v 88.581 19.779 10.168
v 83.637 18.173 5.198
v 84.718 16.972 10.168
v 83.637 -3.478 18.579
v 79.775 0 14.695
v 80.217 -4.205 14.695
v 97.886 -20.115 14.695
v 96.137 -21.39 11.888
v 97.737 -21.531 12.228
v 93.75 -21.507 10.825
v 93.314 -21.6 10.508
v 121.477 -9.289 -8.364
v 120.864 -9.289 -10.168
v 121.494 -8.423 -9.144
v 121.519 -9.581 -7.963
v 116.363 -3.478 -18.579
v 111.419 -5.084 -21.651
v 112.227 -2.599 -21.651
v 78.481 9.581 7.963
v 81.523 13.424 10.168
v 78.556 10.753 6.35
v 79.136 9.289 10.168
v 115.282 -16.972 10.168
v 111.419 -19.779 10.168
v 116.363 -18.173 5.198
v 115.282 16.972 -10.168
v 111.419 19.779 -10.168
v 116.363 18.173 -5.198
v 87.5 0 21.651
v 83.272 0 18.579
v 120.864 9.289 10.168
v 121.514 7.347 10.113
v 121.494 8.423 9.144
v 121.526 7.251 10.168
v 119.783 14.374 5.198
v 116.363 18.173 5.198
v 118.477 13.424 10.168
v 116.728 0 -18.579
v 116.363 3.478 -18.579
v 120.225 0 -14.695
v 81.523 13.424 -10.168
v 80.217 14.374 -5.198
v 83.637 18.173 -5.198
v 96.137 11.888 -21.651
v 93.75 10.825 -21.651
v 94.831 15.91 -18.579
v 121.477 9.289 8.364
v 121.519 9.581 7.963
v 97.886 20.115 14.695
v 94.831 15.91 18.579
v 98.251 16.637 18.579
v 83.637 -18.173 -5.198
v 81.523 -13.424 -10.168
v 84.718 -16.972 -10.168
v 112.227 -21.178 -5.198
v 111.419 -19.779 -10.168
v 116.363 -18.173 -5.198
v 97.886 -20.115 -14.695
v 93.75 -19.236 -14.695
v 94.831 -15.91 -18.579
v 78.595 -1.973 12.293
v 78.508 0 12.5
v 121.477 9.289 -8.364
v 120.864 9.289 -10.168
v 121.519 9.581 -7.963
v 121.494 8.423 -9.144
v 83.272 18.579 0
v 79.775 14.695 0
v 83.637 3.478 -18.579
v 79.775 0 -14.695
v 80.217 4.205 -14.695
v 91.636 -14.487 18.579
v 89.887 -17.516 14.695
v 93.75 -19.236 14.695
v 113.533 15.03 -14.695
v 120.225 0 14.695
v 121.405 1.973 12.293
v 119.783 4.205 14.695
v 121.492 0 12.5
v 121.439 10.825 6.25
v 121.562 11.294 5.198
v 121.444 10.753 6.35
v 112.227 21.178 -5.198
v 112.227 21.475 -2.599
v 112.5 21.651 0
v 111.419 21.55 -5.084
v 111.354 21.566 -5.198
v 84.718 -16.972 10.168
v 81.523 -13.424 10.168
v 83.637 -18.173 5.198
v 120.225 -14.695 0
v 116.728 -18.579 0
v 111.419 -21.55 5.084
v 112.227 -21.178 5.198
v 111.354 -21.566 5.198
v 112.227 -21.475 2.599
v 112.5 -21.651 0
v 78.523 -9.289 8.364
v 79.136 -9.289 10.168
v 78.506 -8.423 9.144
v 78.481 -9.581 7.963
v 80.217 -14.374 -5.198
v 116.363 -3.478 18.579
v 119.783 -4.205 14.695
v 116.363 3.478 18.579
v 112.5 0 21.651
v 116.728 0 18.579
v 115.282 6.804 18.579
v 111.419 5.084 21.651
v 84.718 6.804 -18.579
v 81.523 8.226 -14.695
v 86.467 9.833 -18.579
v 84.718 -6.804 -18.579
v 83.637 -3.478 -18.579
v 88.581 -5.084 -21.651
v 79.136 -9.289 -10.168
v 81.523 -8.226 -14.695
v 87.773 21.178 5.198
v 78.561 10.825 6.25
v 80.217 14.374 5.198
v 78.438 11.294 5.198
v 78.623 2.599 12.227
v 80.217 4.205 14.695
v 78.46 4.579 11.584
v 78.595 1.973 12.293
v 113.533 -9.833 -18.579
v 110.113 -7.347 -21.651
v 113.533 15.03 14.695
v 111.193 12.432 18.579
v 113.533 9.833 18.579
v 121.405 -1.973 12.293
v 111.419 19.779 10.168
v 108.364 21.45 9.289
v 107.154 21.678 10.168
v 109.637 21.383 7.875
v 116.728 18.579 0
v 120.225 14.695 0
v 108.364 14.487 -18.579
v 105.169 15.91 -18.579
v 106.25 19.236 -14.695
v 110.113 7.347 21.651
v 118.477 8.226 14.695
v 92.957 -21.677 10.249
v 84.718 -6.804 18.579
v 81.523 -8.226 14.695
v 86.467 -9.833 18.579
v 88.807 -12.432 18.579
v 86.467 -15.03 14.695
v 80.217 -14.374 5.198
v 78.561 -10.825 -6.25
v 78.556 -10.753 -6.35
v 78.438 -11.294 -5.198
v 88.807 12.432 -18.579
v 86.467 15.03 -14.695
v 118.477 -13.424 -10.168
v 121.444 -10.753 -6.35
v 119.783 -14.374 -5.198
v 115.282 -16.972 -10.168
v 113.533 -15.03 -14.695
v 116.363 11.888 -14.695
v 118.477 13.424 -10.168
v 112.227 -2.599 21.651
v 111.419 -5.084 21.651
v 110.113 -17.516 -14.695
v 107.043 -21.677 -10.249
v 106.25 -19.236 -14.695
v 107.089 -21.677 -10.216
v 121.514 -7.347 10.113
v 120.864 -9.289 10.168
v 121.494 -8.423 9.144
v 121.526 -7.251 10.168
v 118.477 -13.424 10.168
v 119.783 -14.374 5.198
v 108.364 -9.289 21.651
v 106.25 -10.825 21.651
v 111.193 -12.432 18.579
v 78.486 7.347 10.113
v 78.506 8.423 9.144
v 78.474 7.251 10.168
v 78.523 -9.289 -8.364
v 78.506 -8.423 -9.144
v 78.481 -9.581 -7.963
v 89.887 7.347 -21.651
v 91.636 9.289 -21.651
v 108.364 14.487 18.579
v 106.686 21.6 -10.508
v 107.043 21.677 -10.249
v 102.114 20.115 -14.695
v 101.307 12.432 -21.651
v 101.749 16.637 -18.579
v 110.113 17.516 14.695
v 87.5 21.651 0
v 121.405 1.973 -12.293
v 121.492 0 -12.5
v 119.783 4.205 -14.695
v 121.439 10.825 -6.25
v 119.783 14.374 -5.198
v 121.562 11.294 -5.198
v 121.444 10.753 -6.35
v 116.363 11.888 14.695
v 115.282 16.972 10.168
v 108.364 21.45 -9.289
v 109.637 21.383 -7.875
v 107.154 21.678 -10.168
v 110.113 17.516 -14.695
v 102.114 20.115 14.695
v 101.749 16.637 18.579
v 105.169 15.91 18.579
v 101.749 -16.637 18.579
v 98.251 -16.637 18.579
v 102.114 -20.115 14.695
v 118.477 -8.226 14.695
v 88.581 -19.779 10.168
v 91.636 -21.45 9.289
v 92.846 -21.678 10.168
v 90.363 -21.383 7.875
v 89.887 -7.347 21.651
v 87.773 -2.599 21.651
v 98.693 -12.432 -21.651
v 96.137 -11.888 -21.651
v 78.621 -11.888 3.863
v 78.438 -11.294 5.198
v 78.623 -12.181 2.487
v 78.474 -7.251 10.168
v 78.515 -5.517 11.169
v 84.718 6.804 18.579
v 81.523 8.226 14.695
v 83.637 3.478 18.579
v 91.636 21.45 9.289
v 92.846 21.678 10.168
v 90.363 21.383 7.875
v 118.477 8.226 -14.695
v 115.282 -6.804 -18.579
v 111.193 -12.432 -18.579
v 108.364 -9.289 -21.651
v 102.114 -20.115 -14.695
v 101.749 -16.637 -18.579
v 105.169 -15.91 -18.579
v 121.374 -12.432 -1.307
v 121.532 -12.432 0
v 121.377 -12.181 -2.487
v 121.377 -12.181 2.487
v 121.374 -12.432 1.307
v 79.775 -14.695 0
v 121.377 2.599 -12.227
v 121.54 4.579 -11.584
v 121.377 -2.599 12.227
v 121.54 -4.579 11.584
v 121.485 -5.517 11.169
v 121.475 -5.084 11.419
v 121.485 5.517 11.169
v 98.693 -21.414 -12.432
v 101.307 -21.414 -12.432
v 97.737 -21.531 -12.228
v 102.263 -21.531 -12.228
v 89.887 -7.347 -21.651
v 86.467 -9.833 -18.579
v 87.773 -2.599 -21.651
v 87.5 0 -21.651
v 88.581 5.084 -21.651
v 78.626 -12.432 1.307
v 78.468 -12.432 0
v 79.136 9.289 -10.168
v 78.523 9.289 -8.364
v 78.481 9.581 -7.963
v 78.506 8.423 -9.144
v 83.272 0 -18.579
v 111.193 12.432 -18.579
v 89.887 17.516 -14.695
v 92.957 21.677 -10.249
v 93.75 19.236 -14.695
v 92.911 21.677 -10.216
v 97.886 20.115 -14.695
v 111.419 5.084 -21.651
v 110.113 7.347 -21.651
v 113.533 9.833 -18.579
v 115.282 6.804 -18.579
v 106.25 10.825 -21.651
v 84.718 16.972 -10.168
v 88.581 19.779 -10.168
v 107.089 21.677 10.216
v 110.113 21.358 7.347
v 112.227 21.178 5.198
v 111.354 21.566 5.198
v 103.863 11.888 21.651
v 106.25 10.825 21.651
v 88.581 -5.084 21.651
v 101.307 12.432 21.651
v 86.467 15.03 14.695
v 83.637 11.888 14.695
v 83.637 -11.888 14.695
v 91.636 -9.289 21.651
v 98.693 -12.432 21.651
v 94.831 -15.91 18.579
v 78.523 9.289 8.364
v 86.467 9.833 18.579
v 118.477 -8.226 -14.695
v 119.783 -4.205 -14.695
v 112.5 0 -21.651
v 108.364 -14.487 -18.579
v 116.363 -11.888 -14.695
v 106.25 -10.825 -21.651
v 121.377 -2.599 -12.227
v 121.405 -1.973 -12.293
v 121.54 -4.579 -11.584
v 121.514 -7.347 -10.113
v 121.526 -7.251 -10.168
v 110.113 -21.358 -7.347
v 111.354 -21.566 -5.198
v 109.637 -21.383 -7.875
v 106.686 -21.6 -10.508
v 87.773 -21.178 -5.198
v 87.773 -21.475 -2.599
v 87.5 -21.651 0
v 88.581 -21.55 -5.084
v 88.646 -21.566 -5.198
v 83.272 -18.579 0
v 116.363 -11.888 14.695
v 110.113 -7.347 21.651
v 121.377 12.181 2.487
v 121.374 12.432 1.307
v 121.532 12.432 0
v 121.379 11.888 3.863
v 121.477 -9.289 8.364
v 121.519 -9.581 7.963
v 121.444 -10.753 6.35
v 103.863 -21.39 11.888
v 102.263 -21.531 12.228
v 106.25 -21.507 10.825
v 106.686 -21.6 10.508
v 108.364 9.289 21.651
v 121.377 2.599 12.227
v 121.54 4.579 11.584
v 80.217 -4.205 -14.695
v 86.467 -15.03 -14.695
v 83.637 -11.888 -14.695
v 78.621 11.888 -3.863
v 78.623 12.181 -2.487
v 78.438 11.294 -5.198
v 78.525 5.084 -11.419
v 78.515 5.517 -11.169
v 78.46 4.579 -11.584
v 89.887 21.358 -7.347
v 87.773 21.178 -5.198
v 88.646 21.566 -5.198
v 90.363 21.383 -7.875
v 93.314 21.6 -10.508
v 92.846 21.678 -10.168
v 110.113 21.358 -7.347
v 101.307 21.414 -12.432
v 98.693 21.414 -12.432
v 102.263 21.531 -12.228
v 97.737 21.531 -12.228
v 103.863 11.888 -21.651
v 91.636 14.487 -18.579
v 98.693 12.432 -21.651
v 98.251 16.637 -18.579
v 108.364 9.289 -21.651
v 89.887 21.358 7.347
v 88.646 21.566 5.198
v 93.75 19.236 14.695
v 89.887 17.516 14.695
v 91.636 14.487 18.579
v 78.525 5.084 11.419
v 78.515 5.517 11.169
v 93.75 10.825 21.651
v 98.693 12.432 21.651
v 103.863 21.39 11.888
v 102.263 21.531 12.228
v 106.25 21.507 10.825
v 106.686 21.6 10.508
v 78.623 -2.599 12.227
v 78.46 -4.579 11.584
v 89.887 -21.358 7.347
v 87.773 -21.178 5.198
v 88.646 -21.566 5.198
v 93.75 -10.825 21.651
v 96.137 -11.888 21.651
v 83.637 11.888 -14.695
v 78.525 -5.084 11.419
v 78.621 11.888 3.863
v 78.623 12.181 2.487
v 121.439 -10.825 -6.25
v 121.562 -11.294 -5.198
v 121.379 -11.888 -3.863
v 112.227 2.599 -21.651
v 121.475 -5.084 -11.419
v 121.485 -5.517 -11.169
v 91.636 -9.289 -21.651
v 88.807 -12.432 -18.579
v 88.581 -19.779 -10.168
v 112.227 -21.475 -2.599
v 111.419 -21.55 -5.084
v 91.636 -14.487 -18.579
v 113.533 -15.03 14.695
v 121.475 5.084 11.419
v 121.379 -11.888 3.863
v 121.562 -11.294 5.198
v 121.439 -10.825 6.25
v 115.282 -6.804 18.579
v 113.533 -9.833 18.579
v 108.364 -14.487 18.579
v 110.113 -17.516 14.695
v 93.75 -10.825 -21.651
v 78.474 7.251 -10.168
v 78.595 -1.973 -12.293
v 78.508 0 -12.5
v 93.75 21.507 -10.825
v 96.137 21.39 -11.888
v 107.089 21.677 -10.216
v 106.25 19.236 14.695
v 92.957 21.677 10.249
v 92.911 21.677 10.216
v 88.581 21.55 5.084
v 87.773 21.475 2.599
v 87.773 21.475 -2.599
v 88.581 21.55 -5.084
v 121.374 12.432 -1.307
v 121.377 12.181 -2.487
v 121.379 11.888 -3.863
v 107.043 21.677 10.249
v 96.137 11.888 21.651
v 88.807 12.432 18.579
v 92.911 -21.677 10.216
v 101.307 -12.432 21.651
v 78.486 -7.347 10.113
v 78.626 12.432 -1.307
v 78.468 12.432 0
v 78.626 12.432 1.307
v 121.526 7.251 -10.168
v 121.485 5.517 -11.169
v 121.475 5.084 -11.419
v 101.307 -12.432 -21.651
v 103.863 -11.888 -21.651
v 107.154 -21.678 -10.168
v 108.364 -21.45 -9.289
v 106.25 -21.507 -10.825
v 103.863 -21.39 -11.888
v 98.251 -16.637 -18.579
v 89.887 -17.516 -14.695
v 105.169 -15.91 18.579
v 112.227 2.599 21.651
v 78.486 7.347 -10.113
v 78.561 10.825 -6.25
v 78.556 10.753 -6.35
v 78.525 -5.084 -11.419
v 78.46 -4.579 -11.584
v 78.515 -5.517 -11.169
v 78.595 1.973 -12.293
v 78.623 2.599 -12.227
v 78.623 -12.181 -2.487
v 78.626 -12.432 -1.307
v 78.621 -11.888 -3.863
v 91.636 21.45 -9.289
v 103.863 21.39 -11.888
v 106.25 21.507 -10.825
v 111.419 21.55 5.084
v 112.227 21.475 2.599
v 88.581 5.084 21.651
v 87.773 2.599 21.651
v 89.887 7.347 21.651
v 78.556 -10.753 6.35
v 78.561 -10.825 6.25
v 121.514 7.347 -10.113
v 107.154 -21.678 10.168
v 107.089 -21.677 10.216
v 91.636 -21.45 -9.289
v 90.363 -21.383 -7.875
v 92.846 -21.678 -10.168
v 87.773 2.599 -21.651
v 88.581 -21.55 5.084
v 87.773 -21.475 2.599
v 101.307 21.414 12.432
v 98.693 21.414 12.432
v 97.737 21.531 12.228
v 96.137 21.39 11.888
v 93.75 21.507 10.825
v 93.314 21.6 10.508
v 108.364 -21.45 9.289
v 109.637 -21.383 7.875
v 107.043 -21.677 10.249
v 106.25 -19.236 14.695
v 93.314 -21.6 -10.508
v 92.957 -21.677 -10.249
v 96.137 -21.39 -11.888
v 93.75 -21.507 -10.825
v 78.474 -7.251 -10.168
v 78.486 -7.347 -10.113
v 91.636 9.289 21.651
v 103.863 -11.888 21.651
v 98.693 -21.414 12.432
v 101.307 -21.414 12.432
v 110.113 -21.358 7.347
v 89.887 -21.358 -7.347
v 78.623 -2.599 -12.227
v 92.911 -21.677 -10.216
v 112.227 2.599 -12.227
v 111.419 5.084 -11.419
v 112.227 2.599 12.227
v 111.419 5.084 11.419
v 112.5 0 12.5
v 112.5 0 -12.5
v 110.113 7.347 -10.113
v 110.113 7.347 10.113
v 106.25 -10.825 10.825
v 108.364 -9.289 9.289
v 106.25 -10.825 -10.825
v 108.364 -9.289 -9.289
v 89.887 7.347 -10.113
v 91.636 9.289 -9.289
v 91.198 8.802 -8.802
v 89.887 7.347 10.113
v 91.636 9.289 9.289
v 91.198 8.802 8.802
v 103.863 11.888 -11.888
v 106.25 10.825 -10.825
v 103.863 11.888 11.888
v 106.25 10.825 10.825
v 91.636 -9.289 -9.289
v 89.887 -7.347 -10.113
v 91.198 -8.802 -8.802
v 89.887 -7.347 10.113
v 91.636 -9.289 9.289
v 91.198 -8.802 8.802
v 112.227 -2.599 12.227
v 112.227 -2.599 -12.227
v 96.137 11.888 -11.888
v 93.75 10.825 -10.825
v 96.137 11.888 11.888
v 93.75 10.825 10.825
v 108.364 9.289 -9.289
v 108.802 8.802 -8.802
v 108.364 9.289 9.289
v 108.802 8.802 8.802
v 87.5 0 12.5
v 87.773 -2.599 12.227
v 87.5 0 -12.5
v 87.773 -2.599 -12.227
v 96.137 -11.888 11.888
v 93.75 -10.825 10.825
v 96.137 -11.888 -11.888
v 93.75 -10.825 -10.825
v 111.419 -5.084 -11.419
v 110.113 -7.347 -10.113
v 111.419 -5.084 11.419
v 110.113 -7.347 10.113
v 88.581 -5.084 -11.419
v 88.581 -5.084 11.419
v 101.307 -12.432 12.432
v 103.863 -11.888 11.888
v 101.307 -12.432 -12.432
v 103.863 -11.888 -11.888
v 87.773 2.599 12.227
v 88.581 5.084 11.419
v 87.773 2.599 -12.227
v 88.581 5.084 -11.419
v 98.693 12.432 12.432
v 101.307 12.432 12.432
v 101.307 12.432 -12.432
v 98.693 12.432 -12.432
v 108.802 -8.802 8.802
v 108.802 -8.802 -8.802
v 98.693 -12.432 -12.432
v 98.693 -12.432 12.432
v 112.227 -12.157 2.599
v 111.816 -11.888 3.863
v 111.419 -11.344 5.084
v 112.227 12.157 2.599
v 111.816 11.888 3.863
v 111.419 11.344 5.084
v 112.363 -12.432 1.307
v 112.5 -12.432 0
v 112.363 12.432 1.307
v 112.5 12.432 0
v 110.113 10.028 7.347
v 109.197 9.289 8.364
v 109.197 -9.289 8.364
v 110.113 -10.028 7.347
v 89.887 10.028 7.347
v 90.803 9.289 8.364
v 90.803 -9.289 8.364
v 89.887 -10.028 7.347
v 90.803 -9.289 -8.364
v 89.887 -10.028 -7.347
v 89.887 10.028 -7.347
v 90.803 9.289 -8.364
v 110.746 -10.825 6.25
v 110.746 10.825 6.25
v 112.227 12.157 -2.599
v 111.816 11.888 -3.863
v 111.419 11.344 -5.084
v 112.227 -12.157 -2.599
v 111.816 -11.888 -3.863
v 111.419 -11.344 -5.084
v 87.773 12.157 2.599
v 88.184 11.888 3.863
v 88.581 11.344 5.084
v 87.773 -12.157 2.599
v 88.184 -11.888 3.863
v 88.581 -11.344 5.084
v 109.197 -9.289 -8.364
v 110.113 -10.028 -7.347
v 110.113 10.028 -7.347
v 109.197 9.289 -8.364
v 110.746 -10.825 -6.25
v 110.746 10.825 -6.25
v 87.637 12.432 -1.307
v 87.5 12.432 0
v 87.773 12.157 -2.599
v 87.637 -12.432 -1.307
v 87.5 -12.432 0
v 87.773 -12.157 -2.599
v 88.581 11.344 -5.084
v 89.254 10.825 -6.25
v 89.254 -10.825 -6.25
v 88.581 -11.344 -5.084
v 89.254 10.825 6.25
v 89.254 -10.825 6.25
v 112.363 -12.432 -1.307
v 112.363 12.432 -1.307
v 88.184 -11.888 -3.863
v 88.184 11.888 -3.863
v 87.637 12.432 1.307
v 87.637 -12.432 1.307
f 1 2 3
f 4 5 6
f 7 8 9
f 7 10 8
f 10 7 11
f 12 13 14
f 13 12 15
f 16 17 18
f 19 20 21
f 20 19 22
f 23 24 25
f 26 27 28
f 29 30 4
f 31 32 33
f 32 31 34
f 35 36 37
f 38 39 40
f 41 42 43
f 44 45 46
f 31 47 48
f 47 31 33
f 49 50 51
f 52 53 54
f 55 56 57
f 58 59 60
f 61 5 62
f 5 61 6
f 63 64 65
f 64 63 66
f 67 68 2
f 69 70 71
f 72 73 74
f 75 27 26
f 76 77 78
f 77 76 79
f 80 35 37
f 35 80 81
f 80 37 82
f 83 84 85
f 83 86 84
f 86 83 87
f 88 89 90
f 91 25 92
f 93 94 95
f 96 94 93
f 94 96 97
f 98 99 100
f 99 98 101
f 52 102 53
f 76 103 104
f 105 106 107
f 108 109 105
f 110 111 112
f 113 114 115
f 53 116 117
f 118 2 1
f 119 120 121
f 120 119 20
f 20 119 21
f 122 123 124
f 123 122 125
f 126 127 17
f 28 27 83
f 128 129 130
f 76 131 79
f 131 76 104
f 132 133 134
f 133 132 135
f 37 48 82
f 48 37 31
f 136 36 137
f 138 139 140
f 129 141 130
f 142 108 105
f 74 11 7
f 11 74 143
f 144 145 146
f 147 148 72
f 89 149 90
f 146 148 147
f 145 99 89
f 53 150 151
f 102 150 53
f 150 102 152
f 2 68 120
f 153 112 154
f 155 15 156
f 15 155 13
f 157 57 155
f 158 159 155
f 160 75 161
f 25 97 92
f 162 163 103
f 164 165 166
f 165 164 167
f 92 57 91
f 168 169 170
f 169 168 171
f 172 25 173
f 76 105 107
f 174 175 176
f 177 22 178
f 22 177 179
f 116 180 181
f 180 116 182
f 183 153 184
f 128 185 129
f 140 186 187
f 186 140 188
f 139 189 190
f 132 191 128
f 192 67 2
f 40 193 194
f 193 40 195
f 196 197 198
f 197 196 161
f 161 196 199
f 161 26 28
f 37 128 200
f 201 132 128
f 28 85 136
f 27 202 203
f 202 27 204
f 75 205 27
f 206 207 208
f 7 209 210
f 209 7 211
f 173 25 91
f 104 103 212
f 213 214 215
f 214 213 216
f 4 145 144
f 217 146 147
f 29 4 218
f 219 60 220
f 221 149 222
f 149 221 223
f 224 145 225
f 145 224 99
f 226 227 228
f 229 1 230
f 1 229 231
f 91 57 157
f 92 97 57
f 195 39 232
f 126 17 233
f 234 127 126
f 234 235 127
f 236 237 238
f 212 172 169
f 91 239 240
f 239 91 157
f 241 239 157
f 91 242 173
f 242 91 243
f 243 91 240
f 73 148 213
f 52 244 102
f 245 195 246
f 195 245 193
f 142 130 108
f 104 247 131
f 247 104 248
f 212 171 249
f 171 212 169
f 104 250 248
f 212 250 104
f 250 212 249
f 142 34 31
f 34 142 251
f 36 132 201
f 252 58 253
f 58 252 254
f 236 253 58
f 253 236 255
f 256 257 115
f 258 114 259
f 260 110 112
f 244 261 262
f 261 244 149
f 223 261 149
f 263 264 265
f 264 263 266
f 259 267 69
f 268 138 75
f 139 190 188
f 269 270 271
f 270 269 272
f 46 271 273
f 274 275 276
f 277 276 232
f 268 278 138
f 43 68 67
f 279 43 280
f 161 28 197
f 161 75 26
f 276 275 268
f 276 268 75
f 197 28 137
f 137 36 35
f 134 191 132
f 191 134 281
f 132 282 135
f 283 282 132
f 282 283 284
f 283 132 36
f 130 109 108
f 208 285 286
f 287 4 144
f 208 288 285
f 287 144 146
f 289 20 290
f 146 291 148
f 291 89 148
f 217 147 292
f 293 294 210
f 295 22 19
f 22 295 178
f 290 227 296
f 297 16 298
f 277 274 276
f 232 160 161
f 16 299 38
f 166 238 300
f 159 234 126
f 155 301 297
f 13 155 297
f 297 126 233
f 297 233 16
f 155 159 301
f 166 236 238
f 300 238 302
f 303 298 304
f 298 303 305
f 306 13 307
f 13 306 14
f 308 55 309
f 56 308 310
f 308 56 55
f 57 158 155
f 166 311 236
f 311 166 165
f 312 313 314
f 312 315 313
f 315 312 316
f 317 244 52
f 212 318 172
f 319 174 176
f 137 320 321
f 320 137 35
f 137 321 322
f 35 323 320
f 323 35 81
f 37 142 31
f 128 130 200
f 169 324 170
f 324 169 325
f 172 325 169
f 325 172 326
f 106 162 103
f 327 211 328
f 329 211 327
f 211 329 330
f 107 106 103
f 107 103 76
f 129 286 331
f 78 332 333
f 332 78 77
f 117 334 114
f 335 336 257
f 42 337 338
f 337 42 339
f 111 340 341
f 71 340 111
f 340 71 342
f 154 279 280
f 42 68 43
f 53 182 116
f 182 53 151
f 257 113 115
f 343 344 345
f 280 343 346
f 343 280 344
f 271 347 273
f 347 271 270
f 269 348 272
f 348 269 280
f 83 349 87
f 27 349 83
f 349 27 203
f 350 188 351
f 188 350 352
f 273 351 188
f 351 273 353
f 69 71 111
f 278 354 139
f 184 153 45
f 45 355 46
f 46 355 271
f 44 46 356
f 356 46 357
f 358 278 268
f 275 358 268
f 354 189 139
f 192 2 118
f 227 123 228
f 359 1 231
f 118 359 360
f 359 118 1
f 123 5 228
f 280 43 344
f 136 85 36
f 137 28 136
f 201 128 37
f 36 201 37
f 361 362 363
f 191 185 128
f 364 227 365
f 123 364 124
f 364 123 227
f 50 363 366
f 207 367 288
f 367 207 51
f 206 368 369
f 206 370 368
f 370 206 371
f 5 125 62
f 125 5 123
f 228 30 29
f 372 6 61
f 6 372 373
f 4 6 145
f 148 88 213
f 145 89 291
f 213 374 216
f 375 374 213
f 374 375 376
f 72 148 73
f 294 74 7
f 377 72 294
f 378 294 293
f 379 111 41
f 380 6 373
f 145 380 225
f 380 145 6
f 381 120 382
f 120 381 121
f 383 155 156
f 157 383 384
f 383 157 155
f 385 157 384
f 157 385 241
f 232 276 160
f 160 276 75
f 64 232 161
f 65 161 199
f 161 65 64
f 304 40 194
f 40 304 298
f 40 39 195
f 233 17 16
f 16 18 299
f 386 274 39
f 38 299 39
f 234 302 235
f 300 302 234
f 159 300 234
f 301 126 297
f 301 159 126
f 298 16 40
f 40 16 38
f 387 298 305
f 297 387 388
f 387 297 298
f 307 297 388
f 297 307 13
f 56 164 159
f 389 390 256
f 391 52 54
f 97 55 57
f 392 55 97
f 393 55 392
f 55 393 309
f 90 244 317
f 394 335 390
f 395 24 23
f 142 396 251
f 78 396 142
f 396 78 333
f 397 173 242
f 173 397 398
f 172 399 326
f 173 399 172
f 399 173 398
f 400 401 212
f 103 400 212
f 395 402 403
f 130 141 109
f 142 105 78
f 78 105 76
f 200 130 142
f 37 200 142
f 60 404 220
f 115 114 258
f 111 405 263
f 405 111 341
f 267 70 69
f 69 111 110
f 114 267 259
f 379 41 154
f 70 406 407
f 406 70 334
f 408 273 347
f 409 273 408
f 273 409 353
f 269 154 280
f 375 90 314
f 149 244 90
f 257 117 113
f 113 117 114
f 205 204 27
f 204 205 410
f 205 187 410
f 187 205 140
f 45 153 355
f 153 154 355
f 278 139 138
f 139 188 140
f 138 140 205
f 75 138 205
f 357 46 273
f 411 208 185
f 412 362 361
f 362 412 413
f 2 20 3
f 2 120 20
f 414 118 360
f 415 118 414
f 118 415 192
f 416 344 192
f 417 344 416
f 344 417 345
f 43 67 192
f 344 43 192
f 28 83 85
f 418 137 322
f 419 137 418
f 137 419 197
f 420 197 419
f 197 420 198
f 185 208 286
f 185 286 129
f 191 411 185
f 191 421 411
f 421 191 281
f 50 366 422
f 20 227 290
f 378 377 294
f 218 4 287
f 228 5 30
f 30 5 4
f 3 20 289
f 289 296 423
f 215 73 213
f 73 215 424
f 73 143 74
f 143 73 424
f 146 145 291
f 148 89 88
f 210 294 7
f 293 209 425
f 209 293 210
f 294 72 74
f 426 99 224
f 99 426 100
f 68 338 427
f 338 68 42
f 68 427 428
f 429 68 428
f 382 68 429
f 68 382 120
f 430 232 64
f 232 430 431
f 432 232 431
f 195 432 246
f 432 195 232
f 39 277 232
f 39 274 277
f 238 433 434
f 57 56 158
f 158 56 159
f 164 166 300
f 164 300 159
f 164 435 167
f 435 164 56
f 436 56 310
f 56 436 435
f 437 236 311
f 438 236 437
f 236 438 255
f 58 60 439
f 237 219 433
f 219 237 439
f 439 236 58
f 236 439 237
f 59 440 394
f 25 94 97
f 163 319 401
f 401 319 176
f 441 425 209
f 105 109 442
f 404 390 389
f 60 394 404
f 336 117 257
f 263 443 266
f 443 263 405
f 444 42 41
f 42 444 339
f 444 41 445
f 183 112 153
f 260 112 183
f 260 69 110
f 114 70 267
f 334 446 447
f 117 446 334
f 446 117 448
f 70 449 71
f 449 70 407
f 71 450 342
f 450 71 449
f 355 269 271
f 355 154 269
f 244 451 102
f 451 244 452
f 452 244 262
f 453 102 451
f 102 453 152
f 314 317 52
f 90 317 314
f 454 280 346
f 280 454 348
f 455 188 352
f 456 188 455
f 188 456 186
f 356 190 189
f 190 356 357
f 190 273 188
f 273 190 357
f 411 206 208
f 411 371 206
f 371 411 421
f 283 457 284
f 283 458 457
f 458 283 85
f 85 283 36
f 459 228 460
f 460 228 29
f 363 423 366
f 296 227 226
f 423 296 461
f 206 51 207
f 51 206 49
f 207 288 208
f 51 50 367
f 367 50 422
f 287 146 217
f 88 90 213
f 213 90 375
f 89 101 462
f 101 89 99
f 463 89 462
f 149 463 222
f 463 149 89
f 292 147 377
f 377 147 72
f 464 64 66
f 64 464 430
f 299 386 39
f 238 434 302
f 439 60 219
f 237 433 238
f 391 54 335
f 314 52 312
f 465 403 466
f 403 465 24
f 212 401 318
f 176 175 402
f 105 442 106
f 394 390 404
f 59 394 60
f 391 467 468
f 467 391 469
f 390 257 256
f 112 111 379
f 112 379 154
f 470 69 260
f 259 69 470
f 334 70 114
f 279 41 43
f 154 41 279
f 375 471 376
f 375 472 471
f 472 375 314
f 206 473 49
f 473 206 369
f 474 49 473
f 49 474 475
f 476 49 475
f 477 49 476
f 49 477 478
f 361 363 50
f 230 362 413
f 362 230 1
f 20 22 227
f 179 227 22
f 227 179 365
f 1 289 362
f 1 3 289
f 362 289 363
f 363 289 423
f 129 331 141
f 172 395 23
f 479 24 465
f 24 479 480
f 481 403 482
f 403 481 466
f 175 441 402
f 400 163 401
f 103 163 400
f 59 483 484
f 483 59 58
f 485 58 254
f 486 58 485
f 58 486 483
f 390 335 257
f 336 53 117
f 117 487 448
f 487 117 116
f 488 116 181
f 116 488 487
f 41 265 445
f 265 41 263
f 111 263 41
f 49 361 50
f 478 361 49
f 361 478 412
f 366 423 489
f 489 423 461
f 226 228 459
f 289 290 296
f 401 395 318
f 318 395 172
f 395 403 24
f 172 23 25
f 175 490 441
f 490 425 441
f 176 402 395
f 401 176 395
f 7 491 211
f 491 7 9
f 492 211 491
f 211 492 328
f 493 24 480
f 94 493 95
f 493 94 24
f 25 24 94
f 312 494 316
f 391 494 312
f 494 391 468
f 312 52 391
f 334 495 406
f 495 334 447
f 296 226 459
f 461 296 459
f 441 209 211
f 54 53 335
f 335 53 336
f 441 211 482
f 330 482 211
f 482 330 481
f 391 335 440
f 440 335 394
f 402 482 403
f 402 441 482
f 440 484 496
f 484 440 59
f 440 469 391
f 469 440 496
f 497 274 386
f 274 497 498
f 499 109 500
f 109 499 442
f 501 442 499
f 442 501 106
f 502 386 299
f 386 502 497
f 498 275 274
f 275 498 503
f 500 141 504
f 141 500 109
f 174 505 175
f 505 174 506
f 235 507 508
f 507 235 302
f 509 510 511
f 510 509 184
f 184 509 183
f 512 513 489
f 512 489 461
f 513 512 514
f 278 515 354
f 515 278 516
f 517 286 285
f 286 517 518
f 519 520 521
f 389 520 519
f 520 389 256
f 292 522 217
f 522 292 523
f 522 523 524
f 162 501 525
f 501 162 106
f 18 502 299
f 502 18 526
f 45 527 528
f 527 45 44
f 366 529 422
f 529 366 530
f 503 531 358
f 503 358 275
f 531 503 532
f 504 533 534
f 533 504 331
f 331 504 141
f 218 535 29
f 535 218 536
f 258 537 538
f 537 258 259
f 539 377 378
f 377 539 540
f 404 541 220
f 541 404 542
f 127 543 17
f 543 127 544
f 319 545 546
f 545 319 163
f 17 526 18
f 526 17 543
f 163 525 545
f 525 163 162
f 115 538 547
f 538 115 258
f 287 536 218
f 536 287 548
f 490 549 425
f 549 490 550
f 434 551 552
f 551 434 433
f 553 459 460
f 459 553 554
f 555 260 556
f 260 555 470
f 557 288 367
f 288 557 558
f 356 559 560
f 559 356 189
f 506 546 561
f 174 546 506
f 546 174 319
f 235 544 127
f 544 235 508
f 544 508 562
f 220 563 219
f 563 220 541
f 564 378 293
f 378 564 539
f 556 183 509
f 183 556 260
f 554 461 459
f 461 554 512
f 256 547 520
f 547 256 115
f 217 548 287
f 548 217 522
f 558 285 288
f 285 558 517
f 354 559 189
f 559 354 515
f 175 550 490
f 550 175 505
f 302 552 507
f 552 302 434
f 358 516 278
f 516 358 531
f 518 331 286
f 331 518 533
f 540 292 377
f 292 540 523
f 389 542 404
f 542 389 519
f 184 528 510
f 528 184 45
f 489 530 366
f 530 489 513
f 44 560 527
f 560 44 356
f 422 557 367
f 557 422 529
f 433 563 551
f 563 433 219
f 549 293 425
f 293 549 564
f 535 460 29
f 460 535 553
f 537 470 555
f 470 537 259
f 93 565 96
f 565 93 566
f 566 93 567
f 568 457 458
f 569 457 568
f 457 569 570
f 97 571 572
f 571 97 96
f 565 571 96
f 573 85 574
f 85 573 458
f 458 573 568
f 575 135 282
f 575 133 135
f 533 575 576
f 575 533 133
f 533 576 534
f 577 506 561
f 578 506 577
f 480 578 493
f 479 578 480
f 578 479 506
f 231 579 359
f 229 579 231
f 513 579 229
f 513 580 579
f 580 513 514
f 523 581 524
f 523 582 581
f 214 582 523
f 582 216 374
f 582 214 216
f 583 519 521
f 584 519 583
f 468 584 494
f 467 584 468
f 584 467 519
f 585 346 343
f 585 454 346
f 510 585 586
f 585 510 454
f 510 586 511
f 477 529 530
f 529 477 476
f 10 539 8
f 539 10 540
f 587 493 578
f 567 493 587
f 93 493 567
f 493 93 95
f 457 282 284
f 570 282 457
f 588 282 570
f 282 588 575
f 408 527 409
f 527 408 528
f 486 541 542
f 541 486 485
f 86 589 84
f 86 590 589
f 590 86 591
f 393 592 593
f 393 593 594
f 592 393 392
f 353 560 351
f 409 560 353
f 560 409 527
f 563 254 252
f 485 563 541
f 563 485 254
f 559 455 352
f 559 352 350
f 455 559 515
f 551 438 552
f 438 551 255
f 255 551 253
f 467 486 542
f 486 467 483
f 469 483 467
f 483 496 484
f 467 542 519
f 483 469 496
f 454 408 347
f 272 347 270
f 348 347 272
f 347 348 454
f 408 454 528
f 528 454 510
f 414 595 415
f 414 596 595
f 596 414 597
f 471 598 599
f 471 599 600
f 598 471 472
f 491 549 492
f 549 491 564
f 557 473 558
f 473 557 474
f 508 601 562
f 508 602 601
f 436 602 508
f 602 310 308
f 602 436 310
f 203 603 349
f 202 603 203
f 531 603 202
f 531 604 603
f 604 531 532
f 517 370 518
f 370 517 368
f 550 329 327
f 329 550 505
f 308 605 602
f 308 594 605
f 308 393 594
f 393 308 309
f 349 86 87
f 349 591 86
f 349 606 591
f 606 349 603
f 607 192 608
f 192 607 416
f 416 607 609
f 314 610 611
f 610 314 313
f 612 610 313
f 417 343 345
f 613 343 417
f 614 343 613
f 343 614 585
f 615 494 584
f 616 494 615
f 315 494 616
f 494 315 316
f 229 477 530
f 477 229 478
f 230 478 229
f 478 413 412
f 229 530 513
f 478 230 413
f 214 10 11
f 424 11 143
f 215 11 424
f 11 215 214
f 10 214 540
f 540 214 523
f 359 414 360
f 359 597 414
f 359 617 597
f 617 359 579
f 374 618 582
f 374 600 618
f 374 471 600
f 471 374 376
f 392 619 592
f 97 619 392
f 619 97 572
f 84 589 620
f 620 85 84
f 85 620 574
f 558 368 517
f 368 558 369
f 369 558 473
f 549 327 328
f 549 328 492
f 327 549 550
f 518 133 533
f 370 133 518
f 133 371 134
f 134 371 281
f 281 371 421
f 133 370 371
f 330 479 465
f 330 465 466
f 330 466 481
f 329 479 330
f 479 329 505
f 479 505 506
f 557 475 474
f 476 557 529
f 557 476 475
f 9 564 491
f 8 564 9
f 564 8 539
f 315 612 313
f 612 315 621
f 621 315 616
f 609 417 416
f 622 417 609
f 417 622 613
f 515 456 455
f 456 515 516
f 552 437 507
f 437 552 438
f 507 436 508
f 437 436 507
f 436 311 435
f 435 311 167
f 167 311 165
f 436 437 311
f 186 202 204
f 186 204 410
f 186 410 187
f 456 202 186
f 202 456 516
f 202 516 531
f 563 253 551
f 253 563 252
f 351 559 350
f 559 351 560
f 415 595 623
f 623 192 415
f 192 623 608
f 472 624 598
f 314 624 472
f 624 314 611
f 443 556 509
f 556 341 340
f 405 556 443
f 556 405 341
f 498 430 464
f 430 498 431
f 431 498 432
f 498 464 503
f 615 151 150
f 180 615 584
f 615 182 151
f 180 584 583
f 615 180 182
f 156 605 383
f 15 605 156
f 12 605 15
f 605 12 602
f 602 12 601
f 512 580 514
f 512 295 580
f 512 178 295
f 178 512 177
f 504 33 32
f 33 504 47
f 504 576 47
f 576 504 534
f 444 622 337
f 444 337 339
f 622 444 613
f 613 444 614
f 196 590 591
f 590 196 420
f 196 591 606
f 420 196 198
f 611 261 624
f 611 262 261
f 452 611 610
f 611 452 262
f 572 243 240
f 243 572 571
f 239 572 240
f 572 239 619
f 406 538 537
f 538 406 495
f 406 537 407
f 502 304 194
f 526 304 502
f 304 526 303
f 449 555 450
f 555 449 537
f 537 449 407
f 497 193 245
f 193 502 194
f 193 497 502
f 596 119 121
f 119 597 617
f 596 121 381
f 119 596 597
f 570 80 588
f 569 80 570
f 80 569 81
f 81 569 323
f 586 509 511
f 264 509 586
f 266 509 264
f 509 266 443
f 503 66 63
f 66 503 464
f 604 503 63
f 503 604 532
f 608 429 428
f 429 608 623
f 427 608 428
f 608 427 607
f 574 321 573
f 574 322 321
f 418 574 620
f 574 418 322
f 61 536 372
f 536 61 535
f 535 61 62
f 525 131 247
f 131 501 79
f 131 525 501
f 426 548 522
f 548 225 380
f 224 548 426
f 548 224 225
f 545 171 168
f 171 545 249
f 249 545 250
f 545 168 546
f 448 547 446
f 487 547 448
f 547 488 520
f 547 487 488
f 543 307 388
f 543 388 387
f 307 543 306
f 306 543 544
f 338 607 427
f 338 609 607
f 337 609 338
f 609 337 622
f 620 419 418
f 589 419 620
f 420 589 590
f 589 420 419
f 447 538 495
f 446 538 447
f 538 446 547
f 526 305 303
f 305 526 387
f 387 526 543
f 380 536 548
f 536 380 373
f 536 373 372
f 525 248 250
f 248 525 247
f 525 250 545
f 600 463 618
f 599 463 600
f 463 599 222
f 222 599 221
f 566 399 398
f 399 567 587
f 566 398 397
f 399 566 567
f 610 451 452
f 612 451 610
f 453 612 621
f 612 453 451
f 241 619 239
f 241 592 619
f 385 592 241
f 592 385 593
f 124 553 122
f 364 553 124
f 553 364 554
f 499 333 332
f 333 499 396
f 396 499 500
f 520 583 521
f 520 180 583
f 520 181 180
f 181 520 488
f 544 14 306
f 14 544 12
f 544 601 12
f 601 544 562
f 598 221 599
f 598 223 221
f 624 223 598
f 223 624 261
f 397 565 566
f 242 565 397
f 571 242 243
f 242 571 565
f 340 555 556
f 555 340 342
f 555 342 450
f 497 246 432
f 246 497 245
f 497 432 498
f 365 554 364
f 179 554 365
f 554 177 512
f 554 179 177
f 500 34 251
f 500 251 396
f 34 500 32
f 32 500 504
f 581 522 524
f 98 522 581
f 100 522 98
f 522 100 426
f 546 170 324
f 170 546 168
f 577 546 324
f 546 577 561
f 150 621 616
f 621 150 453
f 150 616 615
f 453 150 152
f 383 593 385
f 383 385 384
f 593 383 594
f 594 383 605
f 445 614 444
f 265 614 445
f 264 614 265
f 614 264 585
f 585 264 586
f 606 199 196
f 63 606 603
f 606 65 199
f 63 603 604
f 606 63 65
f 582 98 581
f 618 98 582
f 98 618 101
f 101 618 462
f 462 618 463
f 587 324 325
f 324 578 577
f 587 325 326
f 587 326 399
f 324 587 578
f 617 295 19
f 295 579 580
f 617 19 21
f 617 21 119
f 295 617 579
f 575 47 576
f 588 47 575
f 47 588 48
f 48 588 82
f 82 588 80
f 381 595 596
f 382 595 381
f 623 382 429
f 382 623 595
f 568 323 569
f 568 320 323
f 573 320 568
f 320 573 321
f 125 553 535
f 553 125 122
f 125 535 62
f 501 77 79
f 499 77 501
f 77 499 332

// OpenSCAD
// copy of example001 used for camera tests

module example001()
{
	function r_from_dia(d) = d / 2;

	module rotcy(rot, r, h) {
		rotate(90, rot)
			cylinder(r = r, h = h, center = true);
	}

	difference() {
		sphere(r = r_from_dia(size));
		rotcy([0, 0, 0], cy_r, cy_h);
		rotcy([1, 0, 0], cy_r, cy_h);
		rotcy([0, 1, 0], cy_r, cy_h);
	}

	size = 50;
	hole = 25;

	cy_r = r_from_dia(hole);
	cy_h = r_from_dia(size * 2.5);
}

translate([100,0,0]) example001();
